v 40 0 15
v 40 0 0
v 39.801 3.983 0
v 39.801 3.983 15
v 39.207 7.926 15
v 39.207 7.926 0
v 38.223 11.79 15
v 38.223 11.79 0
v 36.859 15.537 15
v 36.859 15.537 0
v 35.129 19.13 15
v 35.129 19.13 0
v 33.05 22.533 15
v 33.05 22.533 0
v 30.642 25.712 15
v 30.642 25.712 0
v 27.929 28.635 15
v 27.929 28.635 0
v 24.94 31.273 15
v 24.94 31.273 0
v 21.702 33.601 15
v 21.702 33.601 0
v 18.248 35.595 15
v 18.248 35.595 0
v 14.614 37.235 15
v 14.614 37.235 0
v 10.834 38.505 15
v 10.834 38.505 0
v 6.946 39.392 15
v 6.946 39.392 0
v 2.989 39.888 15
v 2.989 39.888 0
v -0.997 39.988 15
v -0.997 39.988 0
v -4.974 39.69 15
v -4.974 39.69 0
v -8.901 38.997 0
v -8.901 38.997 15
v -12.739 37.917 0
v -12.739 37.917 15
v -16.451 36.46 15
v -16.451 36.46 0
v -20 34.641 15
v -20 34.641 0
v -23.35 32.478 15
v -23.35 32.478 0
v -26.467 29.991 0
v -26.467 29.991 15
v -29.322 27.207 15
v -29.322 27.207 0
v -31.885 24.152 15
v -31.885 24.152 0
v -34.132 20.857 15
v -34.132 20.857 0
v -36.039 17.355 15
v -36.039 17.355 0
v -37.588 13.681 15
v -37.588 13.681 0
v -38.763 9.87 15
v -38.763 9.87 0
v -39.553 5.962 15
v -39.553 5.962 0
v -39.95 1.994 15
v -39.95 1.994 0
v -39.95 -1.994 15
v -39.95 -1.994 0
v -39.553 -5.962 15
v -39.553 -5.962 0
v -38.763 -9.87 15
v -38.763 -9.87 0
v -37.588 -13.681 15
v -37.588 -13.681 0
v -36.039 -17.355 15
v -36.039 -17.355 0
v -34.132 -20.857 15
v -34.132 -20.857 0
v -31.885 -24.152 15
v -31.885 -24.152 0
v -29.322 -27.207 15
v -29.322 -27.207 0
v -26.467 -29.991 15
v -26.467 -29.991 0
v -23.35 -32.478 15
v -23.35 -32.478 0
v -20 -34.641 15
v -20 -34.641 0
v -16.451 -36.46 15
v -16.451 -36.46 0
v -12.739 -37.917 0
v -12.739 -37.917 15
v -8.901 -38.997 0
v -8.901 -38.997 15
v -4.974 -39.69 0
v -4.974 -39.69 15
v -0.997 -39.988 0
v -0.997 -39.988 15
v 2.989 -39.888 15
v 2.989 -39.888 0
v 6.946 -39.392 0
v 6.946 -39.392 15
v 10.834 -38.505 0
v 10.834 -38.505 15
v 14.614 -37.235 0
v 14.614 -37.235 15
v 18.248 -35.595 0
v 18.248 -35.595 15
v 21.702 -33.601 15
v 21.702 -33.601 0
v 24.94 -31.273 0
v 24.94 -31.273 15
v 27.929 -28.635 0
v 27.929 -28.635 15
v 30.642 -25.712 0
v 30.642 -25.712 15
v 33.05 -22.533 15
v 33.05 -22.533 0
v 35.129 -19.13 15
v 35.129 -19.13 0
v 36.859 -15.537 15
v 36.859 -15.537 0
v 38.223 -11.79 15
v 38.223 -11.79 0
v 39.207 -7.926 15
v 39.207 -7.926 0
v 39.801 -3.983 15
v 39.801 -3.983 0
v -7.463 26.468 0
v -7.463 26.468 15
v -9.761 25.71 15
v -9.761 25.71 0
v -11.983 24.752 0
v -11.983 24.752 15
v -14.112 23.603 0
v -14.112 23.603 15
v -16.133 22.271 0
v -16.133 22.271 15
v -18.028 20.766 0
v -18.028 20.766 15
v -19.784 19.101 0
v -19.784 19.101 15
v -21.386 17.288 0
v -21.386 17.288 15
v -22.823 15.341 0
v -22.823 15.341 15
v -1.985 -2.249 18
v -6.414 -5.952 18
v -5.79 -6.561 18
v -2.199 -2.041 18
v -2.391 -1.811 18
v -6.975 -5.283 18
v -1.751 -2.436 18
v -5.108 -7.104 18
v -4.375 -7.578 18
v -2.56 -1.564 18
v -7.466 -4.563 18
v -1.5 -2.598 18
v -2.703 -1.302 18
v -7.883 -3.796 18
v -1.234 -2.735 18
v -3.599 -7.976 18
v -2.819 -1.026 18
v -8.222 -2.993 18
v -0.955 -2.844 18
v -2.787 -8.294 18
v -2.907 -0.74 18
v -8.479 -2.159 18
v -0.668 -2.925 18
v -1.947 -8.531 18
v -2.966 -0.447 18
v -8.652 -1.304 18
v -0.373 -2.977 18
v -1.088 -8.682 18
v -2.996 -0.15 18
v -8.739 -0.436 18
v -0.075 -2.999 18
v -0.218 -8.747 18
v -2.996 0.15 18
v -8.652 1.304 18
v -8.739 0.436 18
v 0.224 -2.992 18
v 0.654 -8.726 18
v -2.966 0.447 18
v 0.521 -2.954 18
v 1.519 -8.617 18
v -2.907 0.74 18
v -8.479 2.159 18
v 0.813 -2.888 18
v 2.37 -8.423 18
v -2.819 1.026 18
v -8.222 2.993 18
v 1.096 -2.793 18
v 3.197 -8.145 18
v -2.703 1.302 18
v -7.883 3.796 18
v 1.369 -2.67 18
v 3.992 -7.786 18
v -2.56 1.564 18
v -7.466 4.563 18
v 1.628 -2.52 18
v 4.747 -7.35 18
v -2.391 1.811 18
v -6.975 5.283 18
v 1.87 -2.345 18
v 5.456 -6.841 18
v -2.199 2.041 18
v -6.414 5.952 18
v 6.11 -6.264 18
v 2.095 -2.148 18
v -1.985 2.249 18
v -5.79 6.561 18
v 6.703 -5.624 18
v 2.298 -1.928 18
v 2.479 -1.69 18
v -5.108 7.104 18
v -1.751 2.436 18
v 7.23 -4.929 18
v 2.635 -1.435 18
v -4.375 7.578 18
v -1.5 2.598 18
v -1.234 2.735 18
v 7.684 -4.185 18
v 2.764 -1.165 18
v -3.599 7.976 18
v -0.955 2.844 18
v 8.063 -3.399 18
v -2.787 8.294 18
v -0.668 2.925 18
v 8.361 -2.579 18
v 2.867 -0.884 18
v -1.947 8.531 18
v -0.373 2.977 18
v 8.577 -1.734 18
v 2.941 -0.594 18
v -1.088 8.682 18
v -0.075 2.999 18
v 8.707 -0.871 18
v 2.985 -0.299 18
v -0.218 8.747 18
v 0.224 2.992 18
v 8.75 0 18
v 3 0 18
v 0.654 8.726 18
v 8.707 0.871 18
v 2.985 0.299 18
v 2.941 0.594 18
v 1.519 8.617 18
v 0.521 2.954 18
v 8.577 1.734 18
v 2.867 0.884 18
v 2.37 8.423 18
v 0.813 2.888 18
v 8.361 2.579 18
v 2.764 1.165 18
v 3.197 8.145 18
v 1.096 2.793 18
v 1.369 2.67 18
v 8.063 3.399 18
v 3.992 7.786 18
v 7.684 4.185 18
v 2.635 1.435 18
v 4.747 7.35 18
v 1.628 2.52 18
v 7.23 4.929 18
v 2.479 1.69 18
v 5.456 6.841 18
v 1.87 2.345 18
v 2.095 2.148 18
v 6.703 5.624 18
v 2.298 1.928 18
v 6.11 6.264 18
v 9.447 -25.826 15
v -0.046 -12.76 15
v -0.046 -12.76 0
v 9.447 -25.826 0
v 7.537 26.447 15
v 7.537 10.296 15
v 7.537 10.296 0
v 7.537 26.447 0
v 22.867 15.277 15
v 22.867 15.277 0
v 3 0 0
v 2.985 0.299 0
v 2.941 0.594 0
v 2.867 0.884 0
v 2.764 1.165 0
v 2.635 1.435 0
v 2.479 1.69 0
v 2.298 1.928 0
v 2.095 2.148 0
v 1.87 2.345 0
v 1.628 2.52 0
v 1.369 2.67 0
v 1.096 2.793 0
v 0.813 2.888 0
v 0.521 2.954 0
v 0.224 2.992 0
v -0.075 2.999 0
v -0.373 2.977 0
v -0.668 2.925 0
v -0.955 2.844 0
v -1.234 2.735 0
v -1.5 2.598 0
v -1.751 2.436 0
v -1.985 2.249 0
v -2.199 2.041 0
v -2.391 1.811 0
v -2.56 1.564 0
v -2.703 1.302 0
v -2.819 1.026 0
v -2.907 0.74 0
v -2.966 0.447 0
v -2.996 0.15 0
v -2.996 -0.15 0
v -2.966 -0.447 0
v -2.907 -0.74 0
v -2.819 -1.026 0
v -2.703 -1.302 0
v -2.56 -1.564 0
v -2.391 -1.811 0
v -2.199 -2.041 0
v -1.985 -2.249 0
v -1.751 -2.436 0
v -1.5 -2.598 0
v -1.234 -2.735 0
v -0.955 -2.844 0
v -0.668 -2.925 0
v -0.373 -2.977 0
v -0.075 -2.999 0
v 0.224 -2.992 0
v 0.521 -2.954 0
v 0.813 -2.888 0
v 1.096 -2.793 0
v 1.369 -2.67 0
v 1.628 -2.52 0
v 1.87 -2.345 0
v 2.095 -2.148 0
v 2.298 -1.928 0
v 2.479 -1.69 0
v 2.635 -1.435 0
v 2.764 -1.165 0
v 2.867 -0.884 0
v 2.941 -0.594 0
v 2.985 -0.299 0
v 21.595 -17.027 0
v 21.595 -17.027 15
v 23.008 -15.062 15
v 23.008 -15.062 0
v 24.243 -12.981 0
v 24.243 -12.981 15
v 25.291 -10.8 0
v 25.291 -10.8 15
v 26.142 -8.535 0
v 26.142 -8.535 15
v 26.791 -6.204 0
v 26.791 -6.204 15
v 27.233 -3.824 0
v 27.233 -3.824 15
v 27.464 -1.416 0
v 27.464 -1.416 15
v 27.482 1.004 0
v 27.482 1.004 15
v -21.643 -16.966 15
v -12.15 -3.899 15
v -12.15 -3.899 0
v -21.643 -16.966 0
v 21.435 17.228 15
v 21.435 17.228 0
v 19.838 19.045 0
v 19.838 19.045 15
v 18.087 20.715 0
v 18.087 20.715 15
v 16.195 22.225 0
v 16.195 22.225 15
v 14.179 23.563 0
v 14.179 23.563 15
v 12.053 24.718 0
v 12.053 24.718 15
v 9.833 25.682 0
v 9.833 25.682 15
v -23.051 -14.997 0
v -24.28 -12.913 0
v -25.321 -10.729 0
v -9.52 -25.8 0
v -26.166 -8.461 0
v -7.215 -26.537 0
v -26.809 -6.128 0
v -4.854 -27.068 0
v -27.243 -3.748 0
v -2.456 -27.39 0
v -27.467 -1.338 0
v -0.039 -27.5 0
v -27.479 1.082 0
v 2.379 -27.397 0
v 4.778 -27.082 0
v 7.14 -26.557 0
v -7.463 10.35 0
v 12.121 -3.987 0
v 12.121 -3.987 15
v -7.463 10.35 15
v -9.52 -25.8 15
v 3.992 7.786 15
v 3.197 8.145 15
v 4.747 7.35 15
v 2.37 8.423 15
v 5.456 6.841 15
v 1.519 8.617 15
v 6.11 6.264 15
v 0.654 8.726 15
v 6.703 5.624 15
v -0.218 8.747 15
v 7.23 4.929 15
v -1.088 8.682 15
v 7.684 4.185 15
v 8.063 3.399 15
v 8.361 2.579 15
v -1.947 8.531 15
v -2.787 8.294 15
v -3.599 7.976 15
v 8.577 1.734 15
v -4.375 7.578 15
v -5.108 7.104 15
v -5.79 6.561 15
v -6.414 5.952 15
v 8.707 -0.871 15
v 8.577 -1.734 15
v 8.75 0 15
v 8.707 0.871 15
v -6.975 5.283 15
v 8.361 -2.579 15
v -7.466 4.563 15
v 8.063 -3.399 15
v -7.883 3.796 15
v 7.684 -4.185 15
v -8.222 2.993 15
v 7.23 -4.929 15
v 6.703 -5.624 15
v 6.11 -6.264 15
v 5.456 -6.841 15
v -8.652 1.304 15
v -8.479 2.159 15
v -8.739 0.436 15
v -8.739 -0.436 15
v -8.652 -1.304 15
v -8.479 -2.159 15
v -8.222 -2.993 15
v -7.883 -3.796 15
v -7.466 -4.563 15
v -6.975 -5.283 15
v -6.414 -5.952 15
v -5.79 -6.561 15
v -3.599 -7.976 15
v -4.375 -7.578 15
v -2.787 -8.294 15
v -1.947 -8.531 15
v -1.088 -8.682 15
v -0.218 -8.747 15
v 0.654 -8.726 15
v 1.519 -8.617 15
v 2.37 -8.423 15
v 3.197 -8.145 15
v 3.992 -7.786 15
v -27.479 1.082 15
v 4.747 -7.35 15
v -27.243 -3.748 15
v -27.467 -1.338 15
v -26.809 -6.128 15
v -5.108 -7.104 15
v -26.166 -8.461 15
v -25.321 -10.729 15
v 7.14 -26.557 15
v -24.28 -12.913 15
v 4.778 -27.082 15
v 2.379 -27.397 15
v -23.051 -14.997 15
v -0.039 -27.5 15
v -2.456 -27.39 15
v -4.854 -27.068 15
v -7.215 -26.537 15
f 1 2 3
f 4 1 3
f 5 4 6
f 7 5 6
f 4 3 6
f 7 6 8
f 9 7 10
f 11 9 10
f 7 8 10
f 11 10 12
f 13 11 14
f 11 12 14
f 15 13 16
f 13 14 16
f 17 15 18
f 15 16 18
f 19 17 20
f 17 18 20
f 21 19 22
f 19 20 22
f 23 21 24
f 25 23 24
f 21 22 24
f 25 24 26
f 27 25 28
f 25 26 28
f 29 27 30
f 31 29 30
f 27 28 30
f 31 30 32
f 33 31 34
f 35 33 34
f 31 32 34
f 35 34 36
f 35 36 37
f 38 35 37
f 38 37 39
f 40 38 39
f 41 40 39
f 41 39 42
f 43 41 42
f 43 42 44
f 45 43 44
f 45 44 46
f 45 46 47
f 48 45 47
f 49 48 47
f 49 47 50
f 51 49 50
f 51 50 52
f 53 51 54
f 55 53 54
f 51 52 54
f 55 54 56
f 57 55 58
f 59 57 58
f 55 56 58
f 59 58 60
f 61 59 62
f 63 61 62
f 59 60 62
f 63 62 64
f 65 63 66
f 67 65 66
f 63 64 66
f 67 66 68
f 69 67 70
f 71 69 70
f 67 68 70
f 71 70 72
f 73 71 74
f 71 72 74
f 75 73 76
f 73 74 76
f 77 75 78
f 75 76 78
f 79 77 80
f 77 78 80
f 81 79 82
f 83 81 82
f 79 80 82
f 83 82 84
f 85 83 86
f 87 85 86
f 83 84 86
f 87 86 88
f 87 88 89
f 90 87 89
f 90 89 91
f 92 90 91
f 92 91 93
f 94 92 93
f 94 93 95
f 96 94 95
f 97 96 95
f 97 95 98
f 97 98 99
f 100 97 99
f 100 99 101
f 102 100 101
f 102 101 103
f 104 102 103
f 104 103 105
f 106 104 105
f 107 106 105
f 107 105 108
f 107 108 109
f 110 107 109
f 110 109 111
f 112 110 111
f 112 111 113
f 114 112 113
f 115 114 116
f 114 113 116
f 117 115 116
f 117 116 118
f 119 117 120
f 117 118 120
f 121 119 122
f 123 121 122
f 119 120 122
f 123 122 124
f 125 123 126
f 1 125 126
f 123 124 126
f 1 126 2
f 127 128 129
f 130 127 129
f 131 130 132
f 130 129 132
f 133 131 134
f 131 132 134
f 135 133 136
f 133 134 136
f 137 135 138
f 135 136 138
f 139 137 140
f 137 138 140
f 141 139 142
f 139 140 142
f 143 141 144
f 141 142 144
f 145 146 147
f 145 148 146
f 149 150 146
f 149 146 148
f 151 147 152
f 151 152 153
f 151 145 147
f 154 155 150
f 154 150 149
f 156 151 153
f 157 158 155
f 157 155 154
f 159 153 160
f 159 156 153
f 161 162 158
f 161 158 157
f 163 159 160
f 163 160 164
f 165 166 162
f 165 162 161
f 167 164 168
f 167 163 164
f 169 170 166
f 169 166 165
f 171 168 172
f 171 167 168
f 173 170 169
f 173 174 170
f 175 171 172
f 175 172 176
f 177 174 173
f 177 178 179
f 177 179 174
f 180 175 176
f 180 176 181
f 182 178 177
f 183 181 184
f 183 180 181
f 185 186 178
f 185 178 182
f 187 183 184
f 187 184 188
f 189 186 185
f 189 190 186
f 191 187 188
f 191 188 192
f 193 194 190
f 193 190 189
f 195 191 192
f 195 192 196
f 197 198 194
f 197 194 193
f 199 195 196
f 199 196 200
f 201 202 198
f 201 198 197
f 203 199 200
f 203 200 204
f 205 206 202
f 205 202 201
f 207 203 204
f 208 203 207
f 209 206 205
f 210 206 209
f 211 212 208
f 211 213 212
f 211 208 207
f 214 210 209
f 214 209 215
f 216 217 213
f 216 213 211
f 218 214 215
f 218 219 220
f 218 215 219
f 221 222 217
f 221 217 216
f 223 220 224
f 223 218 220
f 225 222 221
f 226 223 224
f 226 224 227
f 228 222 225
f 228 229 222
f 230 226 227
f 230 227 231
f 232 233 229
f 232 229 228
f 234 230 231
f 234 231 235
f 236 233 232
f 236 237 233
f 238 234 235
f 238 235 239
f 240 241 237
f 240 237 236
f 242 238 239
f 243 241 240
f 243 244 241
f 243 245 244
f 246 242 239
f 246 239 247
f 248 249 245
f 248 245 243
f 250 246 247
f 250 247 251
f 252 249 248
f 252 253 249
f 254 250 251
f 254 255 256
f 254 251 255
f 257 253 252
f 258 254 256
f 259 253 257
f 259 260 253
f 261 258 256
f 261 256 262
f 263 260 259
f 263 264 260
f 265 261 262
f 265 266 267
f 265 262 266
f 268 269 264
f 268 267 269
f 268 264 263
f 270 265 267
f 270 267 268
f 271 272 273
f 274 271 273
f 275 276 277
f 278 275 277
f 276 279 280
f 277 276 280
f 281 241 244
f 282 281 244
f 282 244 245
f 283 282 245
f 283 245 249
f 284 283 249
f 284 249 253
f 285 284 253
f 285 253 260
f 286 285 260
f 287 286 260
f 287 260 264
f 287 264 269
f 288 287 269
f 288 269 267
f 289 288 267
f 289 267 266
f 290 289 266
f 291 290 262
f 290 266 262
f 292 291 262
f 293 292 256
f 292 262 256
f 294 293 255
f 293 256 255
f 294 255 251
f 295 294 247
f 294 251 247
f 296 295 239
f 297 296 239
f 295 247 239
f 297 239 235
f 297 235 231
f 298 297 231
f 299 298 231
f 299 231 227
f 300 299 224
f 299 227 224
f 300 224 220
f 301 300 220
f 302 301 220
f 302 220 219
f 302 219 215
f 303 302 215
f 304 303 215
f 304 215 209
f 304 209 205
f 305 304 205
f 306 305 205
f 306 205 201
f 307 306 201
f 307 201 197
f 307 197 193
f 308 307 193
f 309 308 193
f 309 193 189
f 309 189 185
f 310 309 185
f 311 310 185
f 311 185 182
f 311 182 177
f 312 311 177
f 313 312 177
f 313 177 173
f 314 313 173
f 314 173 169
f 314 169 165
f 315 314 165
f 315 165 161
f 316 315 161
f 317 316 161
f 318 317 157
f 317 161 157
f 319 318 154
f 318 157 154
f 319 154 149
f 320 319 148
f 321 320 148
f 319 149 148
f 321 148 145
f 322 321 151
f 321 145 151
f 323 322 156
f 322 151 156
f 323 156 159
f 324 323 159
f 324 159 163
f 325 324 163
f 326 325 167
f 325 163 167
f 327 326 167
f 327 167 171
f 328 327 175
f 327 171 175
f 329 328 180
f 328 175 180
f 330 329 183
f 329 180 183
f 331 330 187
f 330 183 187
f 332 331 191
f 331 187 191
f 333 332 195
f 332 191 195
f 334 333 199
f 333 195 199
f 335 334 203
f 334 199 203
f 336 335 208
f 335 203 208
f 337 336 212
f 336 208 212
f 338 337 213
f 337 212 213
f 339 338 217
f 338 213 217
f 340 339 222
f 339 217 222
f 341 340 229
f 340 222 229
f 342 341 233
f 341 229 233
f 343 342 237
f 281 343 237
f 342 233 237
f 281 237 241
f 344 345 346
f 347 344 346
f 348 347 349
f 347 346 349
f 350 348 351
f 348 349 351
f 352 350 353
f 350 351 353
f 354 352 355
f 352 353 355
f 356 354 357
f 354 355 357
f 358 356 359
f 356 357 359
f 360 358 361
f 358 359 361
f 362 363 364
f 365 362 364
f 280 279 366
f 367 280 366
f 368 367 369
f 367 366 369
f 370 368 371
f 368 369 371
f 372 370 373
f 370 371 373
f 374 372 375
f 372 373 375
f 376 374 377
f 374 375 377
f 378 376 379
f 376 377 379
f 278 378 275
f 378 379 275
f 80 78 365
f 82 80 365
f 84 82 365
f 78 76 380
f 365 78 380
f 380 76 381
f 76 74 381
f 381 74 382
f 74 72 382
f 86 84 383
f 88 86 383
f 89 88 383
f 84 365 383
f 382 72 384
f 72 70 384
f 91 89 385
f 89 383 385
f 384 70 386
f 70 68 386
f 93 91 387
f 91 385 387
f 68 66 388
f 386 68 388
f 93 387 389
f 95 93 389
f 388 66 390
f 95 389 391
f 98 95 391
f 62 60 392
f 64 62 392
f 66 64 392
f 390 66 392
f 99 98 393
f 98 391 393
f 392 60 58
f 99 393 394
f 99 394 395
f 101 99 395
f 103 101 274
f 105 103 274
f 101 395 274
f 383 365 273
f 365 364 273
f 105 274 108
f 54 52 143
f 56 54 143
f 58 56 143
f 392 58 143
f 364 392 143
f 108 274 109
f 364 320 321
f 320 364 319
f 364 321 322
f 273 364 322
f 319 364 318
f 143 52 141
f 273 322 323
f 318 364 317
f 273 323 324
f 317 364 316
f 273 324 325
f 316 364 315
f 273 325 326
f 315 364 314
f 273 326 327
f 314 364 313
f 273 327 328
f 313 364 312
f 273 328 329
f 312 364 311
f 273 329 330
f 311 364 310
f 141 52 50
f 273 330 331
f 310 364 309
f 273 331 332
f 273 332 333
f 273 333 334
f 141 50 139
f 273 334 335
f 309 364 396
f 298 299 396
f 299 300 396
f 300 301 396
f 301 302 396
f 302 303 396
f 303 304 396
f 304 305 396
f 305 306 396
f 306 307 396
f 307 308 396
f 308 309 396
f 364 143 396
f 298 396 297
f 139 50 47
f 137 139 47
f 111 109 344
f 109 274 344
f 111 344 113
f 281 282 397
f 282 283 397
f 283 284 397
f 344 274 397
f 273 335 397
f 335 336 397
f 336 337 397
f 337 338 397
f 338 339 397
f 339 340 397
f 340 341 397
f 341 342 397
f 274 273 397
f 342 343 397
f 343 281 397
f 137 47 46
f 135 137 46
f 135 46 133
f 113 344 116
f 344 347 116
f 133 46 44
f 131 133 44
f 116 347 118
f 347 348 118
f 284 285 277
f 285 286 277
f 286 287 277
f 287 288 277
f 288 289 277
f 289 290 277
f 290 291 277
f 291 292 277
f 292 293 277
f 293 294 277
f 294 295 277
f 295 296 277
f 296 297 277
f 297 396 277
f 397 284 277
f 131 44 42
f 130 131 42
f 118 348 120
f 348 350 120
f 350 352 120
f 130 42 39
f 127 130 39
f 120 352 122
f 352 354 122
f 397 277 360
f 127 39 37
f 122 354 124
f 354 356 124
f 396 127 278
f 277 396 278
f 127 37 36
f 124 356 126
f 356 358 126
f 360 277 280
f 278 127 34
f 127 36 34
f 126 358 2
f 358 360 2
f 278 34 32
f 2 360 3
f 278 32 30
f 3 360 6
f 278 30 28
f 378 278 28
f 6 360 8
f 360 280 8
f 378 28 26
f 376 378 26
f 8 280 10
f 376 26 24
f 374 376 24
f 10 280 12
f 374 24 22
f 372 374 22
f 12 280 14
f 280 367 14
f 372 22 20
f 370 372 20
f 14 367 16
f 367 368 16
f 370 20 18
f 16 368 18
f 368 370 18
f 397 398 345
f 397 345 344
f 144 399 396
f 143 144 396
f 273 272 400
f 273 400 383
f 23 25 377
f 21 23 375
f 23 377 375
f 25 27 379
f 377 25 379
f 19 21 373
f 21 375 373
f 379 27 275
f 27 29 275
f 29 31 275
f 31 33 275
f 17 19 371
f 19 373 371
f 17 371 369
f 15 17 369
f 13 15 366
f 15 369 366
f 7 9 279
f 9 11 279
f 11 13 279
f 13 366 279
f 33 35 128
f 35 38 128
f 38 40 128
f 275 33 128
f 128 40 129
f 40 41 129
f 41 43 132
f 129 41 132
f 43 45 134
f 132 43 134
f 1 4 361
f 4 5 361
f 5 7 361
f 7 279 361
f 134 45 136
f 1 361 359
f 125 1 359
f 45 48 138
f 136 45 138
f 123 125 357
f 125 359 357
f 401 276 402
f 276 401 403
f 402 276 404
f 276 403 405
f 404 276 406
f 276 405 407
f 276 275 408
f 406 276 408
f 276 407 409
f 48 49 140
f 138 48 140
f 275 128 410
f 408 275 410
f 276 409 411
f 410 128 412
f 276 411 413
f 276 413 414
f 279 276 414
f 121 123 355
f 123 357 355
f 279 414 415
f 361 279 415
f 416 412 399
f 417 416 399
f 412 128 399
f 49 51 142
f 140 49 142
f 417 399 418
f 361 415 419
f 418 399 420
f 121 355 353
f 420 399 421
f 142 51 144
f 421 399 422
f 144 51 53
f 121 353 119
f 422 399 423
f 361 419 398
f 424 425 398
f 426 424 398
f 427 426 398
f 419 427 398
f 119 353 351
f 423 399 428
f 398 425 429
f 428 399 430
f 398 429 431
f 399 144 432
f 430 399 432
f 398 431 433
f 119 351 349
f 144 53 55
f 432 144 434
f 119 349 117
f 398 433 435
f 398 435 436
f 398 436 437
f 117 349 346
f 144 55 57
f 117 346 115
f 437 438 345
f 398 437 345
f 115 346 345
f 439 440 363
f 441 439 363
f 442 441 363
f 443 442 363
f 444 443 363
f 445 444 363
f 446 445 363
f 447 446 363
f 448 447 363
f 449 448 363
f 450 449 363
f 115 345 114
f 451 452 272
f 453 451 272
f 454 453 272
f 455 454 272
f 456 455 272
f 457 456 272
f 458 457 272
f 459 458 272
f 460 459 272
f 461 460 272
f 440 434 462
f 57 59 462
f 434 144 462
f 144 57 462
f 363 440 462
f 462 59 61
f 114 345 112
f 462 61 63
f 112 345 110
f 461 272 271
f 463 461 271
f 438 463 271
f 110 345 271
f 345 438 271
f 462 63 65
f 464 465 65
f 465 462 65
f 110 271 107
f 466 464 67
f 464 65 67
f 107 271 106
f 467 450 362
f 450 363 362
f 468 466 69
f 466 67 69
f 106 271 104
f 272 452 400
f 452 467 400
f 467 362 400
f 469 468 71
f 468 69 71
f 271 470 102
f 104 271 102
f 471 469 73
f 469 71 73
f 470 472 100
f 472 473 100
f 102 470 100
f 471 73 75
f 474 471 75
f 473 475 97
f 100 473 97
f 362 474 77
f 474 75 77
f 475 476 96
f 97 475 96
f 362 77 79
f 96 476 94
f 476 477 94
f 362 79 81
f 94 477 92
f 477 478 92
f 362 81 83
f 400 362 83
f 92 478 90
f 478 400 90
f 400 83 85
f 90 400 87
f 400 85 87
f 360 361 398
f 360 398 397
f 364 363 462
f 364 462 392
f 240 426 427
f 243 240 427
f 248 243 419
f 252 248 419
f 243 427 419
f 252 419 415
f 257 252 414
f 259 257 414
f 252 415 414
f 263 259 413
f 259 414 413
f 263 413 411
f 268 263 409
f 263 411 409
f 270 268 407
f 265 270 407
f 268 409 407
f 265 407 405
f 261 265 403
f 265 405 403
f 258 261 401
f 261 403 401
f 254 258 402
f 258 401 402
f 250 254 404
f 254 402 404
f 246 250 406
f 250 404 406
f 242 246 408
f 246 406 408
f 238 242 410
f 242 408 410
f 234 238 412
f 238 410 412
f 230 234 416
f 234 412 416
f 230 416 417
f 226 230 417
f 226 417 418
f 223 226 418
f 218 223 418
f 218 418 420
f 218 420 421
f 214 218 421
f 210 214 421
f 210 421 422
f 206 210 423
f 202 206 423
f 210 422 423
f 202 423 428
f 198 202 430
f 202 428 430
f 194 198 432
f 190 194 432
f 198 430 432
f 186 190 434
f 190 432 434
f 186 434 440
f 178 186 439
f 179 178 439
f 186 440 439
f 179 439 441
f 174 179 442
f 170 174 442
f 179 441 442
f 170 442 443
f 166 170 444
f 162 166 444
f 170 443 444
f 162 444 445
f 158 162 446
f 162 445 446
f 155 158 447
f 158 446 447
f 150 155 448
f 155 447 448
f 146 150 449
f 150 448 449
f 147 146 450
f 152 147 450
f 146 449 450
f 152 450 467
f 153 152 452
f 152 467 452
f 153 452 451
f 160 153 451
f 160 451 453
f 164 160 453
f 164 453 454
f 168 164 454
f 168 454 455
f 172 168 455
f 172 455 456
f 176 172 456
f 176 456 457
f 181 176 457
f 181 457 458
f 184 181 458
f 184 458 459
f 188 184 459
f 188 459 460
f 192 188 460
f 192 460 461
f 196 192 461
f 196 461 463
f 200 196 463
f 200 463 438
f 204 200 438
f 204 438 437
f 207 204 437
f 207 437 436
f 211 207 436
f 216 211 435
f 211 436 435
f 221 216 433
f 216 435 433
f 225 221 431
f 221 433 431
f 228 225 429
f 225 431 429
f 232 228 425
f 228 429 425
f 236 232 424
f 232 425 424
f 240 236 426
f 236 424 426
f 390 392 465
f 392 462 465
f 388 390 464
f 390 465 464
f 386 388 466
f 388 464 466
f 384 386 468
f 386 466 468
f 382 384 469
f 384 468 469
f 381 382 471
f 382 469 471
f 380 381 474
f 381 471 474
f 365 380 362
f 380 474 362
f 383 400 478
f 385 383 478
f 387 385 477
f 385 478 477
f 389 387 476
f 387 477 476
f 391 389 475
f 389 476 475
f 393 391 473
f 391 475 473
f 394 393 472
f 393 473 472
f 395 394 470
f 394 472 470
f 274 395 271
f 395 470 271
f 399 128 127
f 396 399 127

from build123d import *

# Parameters (mm, degrees)
SKETCH1_R                = 40
BOSS_EXTRUDE1_DEPTH      = 15
SKETCH2_R                = 27.5
CUT_EXTRUDE1_DEPTH       = 59.523499554
SKETCH3_R                = 10
BOSS_EXTRUDE3_DEPTH      = 15
BOSS_EXTRUDE4_REACH      = 60.523
BOSS_EXTRUDE4_END_RADIUS = 27.5
SKETCH5_W                = 15
SKETCH5_H                = 15
CIRPATTERN1_COUNT        = 5
SKETCH6_R                = 8.75
BOSS_EXTRUDE5_DEPTH      = 3
SKETCH7_R                = 3
CUT_EXTRUDE2_DEPTH       = 60.363288319


with BuildPart() as part:
    # Sketch1 → Boss-Extrude1 (new body)
    with BuildSketch(Plane.XY):
        Circle(SKETCH1_R)
    extrude(amount=BOSS_EXTRUDE1_DEPTH)

    # Sketch2 → Cut-Extrude1 (cut, through all)
    with BuildSketch(Plane.XY.offset(15)):
        Circle(SKETCH2_R)
    extrude(amount=-CUT_EXTRUDE1_DEPTH, mode=Mode.SUBTRACT)



with BuildPart() as body_2:
    # Sketch3 → Boss-Extrude3 (new body)
    with BuildSketch(Plane.XY):
        Circle(SKETCH3_R)
    extrude(amount=BOSS_EXTRUDE3_DEPTH)


with BuildPart() as part_1:
    add(part.part)

    add(body_2.part)  # Boss-Extrude4 merges body 2
    # Boss-Extrude4: up to this cylinder (the profile starts inside it)
    boss_extrude4_end = Plane(origin=(0, 0, 7.5), z_dir=(0, 0, 1)) * Cylinder(BOSS_EXTRUDE4_END_RADIUS, 177.046, mode=Mode.PRIVATE)
    # Sketch5 → Boss-Extrude4 (add, up to the surface)
    with BuildSketch(Plane(origin=(0, 0, 0), x_dir=(1, 0, 0), z_dir=(0, 1, 0)), mode=Mode.PRIVATE) as boss_extrude4_sk1:
        with Locations((0.0373245, -7.5)):
            Rectangle(SKETCH5_W, SKETCH5_H)
    boss_extrude4_tool1 = extrude(boss_extrude4_sk1.sketch, amount=BOSS_EXTRUDE4_REACH, mode=Mode.PRIVATE) & boss_extrude4_end
    boss_extrude4 = boss_extrude4_tool1.solids().sort_by_distance((0.037325, 0, 7.5))[0]
    add(boss_extrude4)

    # CirPattern1: Boss-Extrude4 ×5 about axis
    cirpattern1_axis = Axis((0, 0, 0), (0, 0, 1))
    for i in range(1, CIRPATTERN1_COUNT):
        add(boss_extrude4.rotate(cirpattern1_axis, i * 360 / CIRPATTERN1_COUNT))

    # Sketch6 → Boss-Extrude5 (add)
    with BuildSketch(Plane.XY.offset(15)):
        Circle(SKETCH6_R)
    extrude(amount=BOSS_EXTRUDE5_DEPTH)

    # Sketch7 → Cut-Extrude2 (cut, through all)
    with BuildSketch(Plane.XY.offset(18)):
        Circle(SKETCH7_R)
    extrude(amount=-CUT_EXTRUDE2_DEPTH, mode=Mode.SUBTRACT)


solid = part_1.part
